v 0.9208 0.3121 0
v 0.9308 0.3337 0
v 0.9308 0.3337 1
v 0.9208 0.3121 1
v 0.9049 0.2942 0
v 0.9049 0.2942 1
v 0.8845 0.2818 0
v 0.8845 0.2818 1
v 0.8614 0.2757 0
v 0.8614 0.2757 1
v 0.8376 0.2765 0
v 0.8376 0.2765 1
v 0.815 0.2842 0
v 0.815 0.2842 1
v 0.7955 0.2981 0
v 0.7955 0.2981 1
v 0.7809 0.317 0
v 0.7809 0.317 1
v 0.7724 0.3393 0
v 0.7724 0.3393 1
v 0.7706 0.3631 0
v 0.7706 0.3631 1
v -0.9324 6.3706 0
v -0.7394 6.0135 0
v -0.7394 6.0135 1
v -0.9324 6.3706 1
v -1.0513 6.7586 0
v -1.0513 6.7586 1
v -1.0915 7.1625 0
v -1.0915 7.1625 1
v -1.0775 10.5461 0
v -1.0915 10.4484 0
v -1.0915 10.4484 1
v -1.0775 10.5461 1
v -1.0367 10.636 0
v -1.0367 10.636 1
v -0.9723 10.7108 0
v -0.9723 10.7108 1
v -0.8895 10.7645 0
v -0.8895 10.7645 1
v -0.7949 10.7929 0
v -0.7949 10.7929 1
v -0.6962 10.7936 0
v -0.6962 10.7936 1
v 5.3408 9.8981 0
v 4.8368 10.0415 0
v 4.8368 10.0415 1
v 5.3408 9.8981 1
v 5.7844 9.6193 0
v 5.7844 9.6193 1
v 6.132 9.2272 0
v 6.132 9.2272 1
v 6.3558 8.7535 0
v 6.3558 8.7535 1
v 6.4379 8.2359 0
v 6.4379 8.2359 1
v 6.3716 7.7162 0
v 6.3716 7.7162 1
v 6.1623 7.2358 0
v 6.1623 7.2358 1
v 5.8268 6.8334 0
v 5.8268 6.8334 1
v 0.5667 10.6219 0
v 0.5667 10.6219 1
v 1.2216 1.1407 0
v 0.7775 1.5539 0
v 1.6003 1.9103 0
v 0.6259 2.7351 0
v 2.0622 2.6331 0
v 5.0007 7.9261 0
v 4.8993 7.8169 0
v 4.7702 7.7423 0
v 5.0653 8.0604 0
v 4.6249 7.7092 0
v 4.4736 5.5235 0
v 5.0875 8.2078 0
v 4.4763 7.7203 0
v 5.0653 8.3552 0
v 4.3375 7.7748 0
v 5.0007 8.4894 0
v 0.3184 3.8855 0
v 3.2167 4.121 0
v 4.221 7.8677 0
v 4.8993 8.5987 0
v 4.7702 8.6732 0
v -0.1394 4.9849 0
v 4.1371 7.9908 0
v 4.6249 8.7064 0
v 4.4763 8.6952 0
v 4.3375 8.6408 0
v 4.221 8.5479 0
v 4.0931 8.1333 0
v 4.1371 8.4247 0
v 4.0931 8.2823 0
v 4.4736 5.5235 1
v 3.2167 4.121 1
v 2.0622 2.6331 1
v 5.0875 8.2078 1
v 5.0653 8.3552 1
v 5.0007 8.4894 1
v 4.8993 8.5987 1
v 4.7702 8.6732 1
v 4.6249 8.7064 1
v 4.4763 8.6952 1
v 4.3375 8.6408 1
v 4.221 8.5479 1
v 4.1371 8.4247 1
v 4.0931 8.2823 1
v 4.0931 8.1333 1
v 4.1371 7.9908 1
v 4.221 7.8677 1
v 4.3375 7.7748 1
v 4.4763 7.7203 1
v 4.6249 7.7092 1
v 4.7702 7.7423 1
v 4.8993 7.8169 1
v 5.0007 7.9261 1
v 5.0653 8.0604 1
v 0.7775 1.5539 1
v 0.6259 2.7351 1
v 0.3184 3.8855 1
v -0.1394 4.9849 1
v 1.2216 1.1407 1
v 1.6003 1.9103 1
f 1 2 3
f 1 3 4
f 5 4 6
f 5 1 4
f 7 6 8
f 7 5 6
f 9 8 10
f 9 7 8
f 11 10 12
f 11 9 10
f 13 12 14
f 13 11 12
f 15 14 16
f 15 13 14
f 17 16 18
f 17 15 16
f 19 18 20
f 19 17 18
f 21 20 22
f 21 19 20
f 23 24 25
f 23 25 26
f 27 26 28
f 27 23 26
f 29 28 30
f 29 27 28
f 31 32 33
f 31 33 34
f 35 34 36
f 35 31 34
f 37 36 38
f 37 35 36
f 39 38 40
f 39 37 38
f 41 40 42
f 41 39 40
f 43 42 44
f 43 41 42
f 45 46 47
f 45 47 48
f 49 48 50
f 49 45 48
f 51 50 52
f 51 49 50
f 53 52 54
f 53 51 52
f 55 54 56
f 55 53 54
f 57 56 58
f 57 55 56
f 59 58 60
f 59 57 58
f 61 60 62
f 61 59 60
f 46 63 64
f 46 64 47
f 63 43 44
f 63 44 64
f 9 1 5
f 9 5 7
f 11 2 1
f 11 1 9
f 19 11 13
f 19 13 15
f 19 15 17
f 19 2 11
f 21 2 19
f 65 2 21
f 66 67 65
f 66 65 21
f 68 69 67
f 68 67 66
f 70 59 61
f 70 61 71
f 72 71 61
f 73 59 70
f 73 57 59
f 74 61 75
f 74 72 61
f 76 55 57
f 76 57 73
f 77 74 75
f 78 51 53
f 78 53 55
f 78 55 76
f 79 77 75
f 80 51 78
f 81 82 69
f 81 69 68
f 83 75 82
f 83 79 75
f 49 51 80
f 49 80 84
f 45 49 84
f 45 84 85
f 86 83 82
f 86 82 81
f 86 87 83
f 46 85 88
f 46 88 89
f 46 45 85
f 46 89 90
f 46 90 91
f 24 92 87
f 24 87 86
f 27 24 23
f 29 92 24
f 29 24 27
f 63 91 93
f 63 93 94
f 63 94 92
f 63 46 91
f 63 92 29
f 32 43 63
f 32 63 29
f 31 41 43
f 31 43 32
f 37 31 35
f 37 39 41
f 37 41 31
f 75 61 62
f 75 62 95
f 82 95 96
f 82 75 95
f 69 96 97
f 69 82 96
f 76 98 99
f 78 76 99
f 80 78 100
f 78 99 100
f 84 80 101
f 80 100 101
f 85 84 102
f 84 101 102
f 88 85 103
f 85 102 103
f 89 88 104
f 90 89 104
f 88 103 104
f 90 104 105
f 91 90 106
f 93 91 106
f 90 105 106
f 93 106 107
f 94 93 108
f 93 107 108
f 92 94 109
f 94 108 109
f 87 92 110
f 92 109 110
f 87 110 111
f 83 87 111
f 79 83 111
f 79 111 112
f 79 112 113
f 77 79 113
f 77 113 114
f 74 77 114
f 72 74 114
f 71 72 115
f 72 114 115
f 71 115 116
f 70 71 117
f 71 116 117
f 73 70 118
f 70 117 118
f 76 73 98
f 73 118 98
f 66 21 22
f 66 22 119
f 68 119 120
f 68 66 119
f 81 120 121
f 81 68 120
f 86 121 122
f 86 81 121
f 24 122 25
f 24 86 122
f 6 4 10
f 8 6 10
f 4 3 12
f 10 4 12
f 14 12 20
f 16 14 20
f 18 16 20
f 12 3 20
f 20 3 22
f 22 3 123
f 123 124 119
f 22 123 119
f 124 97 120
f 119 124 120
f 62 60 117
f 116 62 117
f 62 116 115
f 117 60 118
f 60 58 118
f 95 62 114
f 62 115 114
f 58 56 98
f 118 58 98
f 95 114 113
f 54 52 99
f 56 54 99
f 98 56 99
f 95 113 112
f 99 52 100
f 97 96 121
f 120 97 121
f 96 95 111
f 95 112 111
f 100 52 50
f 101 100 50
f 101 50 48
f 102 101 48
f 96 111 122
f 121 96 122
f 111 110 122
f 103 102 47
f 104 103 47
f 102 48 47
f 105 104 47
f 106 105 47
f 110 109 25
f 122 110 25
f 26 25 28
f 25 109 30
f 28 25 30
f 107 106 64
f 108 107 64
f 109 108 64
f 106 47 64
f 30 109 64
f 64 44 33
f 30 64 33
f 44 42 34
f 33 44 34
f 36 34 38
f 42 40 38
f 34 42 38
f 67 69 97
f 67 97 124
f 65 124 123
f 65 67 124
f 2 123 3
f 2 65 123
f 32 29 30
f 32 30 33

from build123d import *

# Parameters (mm, degrees)
BOSS_EXTRUDE1_DEPTH = 1
SKETCH2_R           = 0.5
CUT_EXTRUDE1_DEPTH  = 1


with BuildPart() as part:
    # Sketch1 → Boss-Extrude1 (new body)
    with BuildSketch(Plane.XY):
        with BuildLine():
            Line((0.566665575, 10.621911003), (4.836785257, 10.041508622))
            ThreePointArc((4.836785257, 10.041508622), (6.355848418, 8.75345876), (5.826769046, 6.833380545))
            ThreePointArc((5.826769046, 6.833380545), (3.832723198, 4.833381254), (2.062195705, 2.633052095))
            ThreePointArc((2.062195705, 2.633052095), (1.400201905, 1.530760177), (0.930843559, 0.333686241))
            ThreePointArc((0.930843559, 0.333686241), (0.837560316, 0.276531253), (0.770614998, 0.363057438))
            ThreePointArc((0.770614998, 0.363057438), (0.491345948, 3.315426366), (-0.739361897, 6.013542688))
            ThreePointArc((-0.739361897, 6.013542688), (-1.001481879, 6.56165987), (-1.091488982, 7.162524291))
            Line((-1.091488982, 7.162524291), (-1.091488982, 10.448413118))
            ThreePointArc((-1.091488982, 10.448413118), (-0.97227959, 10.710781676), (-0.696246031, 10.793568229))
            Line((-0.696246031, 10.793568229), (0.566665575, 10.621911003))
        make_face()
    extrude(amount=BOSS_EXTRUDE1_DEPTH)

    # Sketch2 → Cut-Extrude1 (cut)
    with BuildSketch(Plane.XY.offset(1)):
        with Locations((4.58754209, 8.207783975)):
            Circle(SKETCH2_R)
    extrude(amount=-CUT_EXTRUDE1_DEPTH, mode=Mode.SUBTRACT)


solid = part.part
